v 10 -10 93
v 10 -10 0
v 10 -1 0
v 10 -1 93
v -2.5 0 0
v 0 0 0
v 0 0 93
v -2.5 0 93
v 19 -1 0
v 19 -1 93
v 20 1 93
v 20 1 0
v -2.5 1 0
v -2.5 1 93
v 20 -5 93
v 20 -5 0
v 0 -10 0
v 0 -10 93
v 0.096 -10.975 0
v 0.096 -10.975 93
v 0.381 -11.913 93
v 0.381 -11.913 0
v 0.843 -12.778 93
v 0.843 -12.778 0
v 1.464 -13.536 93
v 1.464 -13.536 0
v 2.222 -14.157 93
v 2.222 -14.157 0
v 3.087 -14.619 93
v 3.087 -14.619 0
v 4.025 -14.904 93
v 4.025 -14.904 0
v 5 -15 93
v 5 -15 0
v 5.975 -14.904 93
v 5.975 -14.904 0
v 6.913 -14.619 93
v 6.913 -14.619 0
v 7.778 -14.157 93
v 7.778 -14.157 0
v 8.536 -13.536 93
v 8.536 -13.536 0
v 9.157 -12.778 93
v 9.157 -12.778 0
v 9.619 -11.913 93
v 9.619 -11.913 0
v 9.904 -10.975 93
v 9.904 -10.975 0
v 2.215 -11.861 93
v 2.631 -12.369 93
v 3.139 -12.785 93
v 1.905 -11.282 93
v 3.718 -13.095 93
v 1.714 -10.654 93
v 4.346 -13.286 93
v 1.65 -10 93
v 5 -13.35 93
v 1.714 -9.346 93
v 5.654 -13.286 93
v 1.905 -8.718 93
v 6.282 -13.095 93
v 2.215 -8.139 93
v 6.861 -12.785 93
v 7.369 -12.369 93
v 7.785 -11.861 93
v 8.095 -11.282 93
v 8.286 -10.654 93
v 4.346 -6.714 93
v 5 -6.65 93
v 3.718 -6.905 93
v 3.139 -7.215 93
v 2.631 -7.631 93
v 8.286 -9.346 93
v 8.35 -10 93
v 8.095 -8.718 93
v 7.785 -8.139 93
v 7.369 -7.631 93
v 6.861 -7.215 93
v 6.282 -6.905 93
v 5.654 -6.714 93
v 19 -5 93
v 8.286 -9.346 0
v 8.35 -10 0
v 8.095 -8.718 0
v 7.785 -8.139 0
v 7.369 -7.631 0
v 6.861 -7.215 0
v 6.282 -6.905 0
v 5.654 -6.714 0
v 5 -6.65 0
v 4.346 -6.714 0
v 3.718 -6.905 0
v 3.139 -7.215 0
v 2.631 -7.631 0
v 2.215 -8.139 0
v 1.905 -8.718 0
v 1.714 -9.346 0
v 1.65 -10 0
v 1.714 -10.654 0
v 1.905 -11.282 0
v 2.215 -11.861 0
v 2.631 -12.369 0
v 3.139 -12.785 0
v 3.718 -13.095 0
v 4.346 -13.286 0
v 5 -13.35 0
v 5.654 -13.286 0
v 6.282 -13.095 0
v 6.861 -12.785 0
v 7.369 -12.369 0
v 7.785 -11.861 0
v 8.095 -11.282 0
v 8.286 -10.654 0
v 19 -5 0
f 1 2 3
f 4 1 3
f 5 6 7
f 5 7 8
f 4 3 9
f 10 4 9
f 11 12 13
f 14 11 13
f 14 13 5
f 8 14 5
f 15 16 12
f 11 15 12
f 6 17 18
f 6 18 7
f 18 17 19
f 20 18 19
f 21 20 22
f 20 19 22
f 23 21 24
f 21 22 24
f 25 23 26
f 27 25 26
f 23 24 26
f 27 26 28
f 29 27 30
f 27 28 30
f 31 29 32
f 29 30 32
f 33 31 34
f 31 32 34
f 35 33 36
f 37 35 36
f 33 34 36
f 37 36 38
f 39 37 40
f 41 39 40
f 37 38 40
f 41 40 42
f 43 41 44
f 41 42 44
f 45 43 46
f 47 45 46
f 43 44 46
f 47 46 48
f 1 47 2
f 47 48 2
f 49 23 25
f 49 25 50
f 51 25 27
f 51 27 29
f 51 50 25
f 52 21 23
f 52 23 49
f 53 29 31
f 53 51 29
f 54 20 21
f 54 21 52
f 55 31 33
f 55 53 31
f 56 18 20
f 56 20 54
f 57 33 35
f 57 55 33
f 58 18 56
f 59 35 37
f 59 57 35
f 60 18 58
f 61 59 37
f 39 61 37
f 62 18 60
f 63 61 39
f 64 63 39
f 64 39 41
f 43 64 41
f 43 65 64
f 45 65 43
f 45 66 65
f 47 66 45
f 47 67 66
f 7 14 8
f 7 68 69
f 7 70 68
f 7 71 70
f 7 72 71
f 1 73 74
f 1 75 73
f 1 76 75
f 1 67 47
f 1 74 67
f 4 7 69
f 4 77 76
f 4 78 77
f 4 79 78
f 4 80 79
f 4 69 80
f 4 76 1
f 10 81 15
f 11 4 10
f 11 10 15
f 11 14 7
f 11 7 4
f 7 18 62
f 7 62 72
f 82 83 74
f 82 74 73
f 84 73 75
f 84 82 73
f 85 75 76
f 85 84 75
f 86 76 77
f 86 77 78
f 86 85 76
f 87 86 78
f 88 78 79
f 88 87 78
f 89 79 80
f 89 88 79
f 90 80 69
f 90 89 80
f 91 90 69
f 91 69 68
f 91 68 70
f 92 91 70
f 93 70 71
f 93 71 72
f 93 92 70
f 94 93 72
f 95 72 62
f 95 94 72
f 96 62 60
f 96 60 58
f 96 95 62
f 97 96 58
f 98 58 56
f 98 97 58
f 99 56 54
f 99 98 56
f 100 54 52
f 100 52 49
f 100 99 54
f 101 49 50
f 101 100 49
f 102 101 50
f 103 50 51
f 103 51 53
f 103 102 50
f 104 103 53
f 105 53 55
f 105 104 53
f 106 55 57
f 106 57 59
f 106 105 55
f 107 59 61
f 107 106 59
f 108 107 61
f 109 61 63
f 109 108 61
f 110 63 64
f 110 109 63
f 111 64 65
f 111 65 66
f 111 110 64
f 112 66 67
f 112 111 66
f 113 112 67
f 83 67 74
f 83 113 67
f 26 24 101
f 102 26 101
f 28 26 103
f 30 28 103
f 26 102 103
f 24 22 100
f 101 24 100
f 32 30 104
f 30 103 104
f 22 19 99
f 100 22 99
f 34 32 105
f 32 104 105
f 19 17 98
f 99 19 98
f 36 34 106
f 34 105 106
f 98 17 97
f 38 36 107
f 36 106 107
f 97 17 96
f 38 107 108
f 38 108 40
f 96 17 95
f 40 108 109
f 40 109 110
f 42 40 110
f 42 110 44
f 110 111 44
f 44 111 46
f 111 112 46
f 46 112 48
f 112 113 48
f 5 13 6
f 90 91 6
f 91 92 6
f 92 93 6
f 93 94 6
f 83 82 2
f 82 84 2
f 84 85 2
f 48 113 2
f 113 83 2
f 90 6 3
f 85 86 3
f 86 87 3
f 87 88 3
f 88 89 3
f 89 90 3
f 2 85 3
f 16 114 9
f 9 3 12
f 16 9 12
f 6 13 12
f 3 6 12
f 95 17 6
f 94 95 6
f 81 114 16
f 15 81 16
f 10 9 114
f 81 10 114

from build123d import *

# Parameters (mm, degrees)
SKETCH_R  = 3.35
PAD_DEPTH = 93


with BuildPart() as part:
    # Sketch → Pad (new body)
    with BuildSketch(Plane.XY):
        with BuildLine():
            Line((20, 1), (-2.5, 1))
            Line((-2.5, 1), (-2.5, 0))
            Line((0, 0), (-2.5, 0))
            Line((0, -10), (0, 0))
            ThreePointArc((0, -10), (5, -15), (10, -10))
            Line((10, -10), (10, -1))
            Line((10, -1), (19, -1))
            Line((19, -1), (19, -5))
            Line((19, -5), (20, -5))
            Line((20, -5), (20, 1))
        make_face()
        with Locations((5, -10)):
            Circle(SKETCH_R, mode=Mode.SUBTRACT)
    extrude(amount=PAD_DEPTH)


solid = part.part
